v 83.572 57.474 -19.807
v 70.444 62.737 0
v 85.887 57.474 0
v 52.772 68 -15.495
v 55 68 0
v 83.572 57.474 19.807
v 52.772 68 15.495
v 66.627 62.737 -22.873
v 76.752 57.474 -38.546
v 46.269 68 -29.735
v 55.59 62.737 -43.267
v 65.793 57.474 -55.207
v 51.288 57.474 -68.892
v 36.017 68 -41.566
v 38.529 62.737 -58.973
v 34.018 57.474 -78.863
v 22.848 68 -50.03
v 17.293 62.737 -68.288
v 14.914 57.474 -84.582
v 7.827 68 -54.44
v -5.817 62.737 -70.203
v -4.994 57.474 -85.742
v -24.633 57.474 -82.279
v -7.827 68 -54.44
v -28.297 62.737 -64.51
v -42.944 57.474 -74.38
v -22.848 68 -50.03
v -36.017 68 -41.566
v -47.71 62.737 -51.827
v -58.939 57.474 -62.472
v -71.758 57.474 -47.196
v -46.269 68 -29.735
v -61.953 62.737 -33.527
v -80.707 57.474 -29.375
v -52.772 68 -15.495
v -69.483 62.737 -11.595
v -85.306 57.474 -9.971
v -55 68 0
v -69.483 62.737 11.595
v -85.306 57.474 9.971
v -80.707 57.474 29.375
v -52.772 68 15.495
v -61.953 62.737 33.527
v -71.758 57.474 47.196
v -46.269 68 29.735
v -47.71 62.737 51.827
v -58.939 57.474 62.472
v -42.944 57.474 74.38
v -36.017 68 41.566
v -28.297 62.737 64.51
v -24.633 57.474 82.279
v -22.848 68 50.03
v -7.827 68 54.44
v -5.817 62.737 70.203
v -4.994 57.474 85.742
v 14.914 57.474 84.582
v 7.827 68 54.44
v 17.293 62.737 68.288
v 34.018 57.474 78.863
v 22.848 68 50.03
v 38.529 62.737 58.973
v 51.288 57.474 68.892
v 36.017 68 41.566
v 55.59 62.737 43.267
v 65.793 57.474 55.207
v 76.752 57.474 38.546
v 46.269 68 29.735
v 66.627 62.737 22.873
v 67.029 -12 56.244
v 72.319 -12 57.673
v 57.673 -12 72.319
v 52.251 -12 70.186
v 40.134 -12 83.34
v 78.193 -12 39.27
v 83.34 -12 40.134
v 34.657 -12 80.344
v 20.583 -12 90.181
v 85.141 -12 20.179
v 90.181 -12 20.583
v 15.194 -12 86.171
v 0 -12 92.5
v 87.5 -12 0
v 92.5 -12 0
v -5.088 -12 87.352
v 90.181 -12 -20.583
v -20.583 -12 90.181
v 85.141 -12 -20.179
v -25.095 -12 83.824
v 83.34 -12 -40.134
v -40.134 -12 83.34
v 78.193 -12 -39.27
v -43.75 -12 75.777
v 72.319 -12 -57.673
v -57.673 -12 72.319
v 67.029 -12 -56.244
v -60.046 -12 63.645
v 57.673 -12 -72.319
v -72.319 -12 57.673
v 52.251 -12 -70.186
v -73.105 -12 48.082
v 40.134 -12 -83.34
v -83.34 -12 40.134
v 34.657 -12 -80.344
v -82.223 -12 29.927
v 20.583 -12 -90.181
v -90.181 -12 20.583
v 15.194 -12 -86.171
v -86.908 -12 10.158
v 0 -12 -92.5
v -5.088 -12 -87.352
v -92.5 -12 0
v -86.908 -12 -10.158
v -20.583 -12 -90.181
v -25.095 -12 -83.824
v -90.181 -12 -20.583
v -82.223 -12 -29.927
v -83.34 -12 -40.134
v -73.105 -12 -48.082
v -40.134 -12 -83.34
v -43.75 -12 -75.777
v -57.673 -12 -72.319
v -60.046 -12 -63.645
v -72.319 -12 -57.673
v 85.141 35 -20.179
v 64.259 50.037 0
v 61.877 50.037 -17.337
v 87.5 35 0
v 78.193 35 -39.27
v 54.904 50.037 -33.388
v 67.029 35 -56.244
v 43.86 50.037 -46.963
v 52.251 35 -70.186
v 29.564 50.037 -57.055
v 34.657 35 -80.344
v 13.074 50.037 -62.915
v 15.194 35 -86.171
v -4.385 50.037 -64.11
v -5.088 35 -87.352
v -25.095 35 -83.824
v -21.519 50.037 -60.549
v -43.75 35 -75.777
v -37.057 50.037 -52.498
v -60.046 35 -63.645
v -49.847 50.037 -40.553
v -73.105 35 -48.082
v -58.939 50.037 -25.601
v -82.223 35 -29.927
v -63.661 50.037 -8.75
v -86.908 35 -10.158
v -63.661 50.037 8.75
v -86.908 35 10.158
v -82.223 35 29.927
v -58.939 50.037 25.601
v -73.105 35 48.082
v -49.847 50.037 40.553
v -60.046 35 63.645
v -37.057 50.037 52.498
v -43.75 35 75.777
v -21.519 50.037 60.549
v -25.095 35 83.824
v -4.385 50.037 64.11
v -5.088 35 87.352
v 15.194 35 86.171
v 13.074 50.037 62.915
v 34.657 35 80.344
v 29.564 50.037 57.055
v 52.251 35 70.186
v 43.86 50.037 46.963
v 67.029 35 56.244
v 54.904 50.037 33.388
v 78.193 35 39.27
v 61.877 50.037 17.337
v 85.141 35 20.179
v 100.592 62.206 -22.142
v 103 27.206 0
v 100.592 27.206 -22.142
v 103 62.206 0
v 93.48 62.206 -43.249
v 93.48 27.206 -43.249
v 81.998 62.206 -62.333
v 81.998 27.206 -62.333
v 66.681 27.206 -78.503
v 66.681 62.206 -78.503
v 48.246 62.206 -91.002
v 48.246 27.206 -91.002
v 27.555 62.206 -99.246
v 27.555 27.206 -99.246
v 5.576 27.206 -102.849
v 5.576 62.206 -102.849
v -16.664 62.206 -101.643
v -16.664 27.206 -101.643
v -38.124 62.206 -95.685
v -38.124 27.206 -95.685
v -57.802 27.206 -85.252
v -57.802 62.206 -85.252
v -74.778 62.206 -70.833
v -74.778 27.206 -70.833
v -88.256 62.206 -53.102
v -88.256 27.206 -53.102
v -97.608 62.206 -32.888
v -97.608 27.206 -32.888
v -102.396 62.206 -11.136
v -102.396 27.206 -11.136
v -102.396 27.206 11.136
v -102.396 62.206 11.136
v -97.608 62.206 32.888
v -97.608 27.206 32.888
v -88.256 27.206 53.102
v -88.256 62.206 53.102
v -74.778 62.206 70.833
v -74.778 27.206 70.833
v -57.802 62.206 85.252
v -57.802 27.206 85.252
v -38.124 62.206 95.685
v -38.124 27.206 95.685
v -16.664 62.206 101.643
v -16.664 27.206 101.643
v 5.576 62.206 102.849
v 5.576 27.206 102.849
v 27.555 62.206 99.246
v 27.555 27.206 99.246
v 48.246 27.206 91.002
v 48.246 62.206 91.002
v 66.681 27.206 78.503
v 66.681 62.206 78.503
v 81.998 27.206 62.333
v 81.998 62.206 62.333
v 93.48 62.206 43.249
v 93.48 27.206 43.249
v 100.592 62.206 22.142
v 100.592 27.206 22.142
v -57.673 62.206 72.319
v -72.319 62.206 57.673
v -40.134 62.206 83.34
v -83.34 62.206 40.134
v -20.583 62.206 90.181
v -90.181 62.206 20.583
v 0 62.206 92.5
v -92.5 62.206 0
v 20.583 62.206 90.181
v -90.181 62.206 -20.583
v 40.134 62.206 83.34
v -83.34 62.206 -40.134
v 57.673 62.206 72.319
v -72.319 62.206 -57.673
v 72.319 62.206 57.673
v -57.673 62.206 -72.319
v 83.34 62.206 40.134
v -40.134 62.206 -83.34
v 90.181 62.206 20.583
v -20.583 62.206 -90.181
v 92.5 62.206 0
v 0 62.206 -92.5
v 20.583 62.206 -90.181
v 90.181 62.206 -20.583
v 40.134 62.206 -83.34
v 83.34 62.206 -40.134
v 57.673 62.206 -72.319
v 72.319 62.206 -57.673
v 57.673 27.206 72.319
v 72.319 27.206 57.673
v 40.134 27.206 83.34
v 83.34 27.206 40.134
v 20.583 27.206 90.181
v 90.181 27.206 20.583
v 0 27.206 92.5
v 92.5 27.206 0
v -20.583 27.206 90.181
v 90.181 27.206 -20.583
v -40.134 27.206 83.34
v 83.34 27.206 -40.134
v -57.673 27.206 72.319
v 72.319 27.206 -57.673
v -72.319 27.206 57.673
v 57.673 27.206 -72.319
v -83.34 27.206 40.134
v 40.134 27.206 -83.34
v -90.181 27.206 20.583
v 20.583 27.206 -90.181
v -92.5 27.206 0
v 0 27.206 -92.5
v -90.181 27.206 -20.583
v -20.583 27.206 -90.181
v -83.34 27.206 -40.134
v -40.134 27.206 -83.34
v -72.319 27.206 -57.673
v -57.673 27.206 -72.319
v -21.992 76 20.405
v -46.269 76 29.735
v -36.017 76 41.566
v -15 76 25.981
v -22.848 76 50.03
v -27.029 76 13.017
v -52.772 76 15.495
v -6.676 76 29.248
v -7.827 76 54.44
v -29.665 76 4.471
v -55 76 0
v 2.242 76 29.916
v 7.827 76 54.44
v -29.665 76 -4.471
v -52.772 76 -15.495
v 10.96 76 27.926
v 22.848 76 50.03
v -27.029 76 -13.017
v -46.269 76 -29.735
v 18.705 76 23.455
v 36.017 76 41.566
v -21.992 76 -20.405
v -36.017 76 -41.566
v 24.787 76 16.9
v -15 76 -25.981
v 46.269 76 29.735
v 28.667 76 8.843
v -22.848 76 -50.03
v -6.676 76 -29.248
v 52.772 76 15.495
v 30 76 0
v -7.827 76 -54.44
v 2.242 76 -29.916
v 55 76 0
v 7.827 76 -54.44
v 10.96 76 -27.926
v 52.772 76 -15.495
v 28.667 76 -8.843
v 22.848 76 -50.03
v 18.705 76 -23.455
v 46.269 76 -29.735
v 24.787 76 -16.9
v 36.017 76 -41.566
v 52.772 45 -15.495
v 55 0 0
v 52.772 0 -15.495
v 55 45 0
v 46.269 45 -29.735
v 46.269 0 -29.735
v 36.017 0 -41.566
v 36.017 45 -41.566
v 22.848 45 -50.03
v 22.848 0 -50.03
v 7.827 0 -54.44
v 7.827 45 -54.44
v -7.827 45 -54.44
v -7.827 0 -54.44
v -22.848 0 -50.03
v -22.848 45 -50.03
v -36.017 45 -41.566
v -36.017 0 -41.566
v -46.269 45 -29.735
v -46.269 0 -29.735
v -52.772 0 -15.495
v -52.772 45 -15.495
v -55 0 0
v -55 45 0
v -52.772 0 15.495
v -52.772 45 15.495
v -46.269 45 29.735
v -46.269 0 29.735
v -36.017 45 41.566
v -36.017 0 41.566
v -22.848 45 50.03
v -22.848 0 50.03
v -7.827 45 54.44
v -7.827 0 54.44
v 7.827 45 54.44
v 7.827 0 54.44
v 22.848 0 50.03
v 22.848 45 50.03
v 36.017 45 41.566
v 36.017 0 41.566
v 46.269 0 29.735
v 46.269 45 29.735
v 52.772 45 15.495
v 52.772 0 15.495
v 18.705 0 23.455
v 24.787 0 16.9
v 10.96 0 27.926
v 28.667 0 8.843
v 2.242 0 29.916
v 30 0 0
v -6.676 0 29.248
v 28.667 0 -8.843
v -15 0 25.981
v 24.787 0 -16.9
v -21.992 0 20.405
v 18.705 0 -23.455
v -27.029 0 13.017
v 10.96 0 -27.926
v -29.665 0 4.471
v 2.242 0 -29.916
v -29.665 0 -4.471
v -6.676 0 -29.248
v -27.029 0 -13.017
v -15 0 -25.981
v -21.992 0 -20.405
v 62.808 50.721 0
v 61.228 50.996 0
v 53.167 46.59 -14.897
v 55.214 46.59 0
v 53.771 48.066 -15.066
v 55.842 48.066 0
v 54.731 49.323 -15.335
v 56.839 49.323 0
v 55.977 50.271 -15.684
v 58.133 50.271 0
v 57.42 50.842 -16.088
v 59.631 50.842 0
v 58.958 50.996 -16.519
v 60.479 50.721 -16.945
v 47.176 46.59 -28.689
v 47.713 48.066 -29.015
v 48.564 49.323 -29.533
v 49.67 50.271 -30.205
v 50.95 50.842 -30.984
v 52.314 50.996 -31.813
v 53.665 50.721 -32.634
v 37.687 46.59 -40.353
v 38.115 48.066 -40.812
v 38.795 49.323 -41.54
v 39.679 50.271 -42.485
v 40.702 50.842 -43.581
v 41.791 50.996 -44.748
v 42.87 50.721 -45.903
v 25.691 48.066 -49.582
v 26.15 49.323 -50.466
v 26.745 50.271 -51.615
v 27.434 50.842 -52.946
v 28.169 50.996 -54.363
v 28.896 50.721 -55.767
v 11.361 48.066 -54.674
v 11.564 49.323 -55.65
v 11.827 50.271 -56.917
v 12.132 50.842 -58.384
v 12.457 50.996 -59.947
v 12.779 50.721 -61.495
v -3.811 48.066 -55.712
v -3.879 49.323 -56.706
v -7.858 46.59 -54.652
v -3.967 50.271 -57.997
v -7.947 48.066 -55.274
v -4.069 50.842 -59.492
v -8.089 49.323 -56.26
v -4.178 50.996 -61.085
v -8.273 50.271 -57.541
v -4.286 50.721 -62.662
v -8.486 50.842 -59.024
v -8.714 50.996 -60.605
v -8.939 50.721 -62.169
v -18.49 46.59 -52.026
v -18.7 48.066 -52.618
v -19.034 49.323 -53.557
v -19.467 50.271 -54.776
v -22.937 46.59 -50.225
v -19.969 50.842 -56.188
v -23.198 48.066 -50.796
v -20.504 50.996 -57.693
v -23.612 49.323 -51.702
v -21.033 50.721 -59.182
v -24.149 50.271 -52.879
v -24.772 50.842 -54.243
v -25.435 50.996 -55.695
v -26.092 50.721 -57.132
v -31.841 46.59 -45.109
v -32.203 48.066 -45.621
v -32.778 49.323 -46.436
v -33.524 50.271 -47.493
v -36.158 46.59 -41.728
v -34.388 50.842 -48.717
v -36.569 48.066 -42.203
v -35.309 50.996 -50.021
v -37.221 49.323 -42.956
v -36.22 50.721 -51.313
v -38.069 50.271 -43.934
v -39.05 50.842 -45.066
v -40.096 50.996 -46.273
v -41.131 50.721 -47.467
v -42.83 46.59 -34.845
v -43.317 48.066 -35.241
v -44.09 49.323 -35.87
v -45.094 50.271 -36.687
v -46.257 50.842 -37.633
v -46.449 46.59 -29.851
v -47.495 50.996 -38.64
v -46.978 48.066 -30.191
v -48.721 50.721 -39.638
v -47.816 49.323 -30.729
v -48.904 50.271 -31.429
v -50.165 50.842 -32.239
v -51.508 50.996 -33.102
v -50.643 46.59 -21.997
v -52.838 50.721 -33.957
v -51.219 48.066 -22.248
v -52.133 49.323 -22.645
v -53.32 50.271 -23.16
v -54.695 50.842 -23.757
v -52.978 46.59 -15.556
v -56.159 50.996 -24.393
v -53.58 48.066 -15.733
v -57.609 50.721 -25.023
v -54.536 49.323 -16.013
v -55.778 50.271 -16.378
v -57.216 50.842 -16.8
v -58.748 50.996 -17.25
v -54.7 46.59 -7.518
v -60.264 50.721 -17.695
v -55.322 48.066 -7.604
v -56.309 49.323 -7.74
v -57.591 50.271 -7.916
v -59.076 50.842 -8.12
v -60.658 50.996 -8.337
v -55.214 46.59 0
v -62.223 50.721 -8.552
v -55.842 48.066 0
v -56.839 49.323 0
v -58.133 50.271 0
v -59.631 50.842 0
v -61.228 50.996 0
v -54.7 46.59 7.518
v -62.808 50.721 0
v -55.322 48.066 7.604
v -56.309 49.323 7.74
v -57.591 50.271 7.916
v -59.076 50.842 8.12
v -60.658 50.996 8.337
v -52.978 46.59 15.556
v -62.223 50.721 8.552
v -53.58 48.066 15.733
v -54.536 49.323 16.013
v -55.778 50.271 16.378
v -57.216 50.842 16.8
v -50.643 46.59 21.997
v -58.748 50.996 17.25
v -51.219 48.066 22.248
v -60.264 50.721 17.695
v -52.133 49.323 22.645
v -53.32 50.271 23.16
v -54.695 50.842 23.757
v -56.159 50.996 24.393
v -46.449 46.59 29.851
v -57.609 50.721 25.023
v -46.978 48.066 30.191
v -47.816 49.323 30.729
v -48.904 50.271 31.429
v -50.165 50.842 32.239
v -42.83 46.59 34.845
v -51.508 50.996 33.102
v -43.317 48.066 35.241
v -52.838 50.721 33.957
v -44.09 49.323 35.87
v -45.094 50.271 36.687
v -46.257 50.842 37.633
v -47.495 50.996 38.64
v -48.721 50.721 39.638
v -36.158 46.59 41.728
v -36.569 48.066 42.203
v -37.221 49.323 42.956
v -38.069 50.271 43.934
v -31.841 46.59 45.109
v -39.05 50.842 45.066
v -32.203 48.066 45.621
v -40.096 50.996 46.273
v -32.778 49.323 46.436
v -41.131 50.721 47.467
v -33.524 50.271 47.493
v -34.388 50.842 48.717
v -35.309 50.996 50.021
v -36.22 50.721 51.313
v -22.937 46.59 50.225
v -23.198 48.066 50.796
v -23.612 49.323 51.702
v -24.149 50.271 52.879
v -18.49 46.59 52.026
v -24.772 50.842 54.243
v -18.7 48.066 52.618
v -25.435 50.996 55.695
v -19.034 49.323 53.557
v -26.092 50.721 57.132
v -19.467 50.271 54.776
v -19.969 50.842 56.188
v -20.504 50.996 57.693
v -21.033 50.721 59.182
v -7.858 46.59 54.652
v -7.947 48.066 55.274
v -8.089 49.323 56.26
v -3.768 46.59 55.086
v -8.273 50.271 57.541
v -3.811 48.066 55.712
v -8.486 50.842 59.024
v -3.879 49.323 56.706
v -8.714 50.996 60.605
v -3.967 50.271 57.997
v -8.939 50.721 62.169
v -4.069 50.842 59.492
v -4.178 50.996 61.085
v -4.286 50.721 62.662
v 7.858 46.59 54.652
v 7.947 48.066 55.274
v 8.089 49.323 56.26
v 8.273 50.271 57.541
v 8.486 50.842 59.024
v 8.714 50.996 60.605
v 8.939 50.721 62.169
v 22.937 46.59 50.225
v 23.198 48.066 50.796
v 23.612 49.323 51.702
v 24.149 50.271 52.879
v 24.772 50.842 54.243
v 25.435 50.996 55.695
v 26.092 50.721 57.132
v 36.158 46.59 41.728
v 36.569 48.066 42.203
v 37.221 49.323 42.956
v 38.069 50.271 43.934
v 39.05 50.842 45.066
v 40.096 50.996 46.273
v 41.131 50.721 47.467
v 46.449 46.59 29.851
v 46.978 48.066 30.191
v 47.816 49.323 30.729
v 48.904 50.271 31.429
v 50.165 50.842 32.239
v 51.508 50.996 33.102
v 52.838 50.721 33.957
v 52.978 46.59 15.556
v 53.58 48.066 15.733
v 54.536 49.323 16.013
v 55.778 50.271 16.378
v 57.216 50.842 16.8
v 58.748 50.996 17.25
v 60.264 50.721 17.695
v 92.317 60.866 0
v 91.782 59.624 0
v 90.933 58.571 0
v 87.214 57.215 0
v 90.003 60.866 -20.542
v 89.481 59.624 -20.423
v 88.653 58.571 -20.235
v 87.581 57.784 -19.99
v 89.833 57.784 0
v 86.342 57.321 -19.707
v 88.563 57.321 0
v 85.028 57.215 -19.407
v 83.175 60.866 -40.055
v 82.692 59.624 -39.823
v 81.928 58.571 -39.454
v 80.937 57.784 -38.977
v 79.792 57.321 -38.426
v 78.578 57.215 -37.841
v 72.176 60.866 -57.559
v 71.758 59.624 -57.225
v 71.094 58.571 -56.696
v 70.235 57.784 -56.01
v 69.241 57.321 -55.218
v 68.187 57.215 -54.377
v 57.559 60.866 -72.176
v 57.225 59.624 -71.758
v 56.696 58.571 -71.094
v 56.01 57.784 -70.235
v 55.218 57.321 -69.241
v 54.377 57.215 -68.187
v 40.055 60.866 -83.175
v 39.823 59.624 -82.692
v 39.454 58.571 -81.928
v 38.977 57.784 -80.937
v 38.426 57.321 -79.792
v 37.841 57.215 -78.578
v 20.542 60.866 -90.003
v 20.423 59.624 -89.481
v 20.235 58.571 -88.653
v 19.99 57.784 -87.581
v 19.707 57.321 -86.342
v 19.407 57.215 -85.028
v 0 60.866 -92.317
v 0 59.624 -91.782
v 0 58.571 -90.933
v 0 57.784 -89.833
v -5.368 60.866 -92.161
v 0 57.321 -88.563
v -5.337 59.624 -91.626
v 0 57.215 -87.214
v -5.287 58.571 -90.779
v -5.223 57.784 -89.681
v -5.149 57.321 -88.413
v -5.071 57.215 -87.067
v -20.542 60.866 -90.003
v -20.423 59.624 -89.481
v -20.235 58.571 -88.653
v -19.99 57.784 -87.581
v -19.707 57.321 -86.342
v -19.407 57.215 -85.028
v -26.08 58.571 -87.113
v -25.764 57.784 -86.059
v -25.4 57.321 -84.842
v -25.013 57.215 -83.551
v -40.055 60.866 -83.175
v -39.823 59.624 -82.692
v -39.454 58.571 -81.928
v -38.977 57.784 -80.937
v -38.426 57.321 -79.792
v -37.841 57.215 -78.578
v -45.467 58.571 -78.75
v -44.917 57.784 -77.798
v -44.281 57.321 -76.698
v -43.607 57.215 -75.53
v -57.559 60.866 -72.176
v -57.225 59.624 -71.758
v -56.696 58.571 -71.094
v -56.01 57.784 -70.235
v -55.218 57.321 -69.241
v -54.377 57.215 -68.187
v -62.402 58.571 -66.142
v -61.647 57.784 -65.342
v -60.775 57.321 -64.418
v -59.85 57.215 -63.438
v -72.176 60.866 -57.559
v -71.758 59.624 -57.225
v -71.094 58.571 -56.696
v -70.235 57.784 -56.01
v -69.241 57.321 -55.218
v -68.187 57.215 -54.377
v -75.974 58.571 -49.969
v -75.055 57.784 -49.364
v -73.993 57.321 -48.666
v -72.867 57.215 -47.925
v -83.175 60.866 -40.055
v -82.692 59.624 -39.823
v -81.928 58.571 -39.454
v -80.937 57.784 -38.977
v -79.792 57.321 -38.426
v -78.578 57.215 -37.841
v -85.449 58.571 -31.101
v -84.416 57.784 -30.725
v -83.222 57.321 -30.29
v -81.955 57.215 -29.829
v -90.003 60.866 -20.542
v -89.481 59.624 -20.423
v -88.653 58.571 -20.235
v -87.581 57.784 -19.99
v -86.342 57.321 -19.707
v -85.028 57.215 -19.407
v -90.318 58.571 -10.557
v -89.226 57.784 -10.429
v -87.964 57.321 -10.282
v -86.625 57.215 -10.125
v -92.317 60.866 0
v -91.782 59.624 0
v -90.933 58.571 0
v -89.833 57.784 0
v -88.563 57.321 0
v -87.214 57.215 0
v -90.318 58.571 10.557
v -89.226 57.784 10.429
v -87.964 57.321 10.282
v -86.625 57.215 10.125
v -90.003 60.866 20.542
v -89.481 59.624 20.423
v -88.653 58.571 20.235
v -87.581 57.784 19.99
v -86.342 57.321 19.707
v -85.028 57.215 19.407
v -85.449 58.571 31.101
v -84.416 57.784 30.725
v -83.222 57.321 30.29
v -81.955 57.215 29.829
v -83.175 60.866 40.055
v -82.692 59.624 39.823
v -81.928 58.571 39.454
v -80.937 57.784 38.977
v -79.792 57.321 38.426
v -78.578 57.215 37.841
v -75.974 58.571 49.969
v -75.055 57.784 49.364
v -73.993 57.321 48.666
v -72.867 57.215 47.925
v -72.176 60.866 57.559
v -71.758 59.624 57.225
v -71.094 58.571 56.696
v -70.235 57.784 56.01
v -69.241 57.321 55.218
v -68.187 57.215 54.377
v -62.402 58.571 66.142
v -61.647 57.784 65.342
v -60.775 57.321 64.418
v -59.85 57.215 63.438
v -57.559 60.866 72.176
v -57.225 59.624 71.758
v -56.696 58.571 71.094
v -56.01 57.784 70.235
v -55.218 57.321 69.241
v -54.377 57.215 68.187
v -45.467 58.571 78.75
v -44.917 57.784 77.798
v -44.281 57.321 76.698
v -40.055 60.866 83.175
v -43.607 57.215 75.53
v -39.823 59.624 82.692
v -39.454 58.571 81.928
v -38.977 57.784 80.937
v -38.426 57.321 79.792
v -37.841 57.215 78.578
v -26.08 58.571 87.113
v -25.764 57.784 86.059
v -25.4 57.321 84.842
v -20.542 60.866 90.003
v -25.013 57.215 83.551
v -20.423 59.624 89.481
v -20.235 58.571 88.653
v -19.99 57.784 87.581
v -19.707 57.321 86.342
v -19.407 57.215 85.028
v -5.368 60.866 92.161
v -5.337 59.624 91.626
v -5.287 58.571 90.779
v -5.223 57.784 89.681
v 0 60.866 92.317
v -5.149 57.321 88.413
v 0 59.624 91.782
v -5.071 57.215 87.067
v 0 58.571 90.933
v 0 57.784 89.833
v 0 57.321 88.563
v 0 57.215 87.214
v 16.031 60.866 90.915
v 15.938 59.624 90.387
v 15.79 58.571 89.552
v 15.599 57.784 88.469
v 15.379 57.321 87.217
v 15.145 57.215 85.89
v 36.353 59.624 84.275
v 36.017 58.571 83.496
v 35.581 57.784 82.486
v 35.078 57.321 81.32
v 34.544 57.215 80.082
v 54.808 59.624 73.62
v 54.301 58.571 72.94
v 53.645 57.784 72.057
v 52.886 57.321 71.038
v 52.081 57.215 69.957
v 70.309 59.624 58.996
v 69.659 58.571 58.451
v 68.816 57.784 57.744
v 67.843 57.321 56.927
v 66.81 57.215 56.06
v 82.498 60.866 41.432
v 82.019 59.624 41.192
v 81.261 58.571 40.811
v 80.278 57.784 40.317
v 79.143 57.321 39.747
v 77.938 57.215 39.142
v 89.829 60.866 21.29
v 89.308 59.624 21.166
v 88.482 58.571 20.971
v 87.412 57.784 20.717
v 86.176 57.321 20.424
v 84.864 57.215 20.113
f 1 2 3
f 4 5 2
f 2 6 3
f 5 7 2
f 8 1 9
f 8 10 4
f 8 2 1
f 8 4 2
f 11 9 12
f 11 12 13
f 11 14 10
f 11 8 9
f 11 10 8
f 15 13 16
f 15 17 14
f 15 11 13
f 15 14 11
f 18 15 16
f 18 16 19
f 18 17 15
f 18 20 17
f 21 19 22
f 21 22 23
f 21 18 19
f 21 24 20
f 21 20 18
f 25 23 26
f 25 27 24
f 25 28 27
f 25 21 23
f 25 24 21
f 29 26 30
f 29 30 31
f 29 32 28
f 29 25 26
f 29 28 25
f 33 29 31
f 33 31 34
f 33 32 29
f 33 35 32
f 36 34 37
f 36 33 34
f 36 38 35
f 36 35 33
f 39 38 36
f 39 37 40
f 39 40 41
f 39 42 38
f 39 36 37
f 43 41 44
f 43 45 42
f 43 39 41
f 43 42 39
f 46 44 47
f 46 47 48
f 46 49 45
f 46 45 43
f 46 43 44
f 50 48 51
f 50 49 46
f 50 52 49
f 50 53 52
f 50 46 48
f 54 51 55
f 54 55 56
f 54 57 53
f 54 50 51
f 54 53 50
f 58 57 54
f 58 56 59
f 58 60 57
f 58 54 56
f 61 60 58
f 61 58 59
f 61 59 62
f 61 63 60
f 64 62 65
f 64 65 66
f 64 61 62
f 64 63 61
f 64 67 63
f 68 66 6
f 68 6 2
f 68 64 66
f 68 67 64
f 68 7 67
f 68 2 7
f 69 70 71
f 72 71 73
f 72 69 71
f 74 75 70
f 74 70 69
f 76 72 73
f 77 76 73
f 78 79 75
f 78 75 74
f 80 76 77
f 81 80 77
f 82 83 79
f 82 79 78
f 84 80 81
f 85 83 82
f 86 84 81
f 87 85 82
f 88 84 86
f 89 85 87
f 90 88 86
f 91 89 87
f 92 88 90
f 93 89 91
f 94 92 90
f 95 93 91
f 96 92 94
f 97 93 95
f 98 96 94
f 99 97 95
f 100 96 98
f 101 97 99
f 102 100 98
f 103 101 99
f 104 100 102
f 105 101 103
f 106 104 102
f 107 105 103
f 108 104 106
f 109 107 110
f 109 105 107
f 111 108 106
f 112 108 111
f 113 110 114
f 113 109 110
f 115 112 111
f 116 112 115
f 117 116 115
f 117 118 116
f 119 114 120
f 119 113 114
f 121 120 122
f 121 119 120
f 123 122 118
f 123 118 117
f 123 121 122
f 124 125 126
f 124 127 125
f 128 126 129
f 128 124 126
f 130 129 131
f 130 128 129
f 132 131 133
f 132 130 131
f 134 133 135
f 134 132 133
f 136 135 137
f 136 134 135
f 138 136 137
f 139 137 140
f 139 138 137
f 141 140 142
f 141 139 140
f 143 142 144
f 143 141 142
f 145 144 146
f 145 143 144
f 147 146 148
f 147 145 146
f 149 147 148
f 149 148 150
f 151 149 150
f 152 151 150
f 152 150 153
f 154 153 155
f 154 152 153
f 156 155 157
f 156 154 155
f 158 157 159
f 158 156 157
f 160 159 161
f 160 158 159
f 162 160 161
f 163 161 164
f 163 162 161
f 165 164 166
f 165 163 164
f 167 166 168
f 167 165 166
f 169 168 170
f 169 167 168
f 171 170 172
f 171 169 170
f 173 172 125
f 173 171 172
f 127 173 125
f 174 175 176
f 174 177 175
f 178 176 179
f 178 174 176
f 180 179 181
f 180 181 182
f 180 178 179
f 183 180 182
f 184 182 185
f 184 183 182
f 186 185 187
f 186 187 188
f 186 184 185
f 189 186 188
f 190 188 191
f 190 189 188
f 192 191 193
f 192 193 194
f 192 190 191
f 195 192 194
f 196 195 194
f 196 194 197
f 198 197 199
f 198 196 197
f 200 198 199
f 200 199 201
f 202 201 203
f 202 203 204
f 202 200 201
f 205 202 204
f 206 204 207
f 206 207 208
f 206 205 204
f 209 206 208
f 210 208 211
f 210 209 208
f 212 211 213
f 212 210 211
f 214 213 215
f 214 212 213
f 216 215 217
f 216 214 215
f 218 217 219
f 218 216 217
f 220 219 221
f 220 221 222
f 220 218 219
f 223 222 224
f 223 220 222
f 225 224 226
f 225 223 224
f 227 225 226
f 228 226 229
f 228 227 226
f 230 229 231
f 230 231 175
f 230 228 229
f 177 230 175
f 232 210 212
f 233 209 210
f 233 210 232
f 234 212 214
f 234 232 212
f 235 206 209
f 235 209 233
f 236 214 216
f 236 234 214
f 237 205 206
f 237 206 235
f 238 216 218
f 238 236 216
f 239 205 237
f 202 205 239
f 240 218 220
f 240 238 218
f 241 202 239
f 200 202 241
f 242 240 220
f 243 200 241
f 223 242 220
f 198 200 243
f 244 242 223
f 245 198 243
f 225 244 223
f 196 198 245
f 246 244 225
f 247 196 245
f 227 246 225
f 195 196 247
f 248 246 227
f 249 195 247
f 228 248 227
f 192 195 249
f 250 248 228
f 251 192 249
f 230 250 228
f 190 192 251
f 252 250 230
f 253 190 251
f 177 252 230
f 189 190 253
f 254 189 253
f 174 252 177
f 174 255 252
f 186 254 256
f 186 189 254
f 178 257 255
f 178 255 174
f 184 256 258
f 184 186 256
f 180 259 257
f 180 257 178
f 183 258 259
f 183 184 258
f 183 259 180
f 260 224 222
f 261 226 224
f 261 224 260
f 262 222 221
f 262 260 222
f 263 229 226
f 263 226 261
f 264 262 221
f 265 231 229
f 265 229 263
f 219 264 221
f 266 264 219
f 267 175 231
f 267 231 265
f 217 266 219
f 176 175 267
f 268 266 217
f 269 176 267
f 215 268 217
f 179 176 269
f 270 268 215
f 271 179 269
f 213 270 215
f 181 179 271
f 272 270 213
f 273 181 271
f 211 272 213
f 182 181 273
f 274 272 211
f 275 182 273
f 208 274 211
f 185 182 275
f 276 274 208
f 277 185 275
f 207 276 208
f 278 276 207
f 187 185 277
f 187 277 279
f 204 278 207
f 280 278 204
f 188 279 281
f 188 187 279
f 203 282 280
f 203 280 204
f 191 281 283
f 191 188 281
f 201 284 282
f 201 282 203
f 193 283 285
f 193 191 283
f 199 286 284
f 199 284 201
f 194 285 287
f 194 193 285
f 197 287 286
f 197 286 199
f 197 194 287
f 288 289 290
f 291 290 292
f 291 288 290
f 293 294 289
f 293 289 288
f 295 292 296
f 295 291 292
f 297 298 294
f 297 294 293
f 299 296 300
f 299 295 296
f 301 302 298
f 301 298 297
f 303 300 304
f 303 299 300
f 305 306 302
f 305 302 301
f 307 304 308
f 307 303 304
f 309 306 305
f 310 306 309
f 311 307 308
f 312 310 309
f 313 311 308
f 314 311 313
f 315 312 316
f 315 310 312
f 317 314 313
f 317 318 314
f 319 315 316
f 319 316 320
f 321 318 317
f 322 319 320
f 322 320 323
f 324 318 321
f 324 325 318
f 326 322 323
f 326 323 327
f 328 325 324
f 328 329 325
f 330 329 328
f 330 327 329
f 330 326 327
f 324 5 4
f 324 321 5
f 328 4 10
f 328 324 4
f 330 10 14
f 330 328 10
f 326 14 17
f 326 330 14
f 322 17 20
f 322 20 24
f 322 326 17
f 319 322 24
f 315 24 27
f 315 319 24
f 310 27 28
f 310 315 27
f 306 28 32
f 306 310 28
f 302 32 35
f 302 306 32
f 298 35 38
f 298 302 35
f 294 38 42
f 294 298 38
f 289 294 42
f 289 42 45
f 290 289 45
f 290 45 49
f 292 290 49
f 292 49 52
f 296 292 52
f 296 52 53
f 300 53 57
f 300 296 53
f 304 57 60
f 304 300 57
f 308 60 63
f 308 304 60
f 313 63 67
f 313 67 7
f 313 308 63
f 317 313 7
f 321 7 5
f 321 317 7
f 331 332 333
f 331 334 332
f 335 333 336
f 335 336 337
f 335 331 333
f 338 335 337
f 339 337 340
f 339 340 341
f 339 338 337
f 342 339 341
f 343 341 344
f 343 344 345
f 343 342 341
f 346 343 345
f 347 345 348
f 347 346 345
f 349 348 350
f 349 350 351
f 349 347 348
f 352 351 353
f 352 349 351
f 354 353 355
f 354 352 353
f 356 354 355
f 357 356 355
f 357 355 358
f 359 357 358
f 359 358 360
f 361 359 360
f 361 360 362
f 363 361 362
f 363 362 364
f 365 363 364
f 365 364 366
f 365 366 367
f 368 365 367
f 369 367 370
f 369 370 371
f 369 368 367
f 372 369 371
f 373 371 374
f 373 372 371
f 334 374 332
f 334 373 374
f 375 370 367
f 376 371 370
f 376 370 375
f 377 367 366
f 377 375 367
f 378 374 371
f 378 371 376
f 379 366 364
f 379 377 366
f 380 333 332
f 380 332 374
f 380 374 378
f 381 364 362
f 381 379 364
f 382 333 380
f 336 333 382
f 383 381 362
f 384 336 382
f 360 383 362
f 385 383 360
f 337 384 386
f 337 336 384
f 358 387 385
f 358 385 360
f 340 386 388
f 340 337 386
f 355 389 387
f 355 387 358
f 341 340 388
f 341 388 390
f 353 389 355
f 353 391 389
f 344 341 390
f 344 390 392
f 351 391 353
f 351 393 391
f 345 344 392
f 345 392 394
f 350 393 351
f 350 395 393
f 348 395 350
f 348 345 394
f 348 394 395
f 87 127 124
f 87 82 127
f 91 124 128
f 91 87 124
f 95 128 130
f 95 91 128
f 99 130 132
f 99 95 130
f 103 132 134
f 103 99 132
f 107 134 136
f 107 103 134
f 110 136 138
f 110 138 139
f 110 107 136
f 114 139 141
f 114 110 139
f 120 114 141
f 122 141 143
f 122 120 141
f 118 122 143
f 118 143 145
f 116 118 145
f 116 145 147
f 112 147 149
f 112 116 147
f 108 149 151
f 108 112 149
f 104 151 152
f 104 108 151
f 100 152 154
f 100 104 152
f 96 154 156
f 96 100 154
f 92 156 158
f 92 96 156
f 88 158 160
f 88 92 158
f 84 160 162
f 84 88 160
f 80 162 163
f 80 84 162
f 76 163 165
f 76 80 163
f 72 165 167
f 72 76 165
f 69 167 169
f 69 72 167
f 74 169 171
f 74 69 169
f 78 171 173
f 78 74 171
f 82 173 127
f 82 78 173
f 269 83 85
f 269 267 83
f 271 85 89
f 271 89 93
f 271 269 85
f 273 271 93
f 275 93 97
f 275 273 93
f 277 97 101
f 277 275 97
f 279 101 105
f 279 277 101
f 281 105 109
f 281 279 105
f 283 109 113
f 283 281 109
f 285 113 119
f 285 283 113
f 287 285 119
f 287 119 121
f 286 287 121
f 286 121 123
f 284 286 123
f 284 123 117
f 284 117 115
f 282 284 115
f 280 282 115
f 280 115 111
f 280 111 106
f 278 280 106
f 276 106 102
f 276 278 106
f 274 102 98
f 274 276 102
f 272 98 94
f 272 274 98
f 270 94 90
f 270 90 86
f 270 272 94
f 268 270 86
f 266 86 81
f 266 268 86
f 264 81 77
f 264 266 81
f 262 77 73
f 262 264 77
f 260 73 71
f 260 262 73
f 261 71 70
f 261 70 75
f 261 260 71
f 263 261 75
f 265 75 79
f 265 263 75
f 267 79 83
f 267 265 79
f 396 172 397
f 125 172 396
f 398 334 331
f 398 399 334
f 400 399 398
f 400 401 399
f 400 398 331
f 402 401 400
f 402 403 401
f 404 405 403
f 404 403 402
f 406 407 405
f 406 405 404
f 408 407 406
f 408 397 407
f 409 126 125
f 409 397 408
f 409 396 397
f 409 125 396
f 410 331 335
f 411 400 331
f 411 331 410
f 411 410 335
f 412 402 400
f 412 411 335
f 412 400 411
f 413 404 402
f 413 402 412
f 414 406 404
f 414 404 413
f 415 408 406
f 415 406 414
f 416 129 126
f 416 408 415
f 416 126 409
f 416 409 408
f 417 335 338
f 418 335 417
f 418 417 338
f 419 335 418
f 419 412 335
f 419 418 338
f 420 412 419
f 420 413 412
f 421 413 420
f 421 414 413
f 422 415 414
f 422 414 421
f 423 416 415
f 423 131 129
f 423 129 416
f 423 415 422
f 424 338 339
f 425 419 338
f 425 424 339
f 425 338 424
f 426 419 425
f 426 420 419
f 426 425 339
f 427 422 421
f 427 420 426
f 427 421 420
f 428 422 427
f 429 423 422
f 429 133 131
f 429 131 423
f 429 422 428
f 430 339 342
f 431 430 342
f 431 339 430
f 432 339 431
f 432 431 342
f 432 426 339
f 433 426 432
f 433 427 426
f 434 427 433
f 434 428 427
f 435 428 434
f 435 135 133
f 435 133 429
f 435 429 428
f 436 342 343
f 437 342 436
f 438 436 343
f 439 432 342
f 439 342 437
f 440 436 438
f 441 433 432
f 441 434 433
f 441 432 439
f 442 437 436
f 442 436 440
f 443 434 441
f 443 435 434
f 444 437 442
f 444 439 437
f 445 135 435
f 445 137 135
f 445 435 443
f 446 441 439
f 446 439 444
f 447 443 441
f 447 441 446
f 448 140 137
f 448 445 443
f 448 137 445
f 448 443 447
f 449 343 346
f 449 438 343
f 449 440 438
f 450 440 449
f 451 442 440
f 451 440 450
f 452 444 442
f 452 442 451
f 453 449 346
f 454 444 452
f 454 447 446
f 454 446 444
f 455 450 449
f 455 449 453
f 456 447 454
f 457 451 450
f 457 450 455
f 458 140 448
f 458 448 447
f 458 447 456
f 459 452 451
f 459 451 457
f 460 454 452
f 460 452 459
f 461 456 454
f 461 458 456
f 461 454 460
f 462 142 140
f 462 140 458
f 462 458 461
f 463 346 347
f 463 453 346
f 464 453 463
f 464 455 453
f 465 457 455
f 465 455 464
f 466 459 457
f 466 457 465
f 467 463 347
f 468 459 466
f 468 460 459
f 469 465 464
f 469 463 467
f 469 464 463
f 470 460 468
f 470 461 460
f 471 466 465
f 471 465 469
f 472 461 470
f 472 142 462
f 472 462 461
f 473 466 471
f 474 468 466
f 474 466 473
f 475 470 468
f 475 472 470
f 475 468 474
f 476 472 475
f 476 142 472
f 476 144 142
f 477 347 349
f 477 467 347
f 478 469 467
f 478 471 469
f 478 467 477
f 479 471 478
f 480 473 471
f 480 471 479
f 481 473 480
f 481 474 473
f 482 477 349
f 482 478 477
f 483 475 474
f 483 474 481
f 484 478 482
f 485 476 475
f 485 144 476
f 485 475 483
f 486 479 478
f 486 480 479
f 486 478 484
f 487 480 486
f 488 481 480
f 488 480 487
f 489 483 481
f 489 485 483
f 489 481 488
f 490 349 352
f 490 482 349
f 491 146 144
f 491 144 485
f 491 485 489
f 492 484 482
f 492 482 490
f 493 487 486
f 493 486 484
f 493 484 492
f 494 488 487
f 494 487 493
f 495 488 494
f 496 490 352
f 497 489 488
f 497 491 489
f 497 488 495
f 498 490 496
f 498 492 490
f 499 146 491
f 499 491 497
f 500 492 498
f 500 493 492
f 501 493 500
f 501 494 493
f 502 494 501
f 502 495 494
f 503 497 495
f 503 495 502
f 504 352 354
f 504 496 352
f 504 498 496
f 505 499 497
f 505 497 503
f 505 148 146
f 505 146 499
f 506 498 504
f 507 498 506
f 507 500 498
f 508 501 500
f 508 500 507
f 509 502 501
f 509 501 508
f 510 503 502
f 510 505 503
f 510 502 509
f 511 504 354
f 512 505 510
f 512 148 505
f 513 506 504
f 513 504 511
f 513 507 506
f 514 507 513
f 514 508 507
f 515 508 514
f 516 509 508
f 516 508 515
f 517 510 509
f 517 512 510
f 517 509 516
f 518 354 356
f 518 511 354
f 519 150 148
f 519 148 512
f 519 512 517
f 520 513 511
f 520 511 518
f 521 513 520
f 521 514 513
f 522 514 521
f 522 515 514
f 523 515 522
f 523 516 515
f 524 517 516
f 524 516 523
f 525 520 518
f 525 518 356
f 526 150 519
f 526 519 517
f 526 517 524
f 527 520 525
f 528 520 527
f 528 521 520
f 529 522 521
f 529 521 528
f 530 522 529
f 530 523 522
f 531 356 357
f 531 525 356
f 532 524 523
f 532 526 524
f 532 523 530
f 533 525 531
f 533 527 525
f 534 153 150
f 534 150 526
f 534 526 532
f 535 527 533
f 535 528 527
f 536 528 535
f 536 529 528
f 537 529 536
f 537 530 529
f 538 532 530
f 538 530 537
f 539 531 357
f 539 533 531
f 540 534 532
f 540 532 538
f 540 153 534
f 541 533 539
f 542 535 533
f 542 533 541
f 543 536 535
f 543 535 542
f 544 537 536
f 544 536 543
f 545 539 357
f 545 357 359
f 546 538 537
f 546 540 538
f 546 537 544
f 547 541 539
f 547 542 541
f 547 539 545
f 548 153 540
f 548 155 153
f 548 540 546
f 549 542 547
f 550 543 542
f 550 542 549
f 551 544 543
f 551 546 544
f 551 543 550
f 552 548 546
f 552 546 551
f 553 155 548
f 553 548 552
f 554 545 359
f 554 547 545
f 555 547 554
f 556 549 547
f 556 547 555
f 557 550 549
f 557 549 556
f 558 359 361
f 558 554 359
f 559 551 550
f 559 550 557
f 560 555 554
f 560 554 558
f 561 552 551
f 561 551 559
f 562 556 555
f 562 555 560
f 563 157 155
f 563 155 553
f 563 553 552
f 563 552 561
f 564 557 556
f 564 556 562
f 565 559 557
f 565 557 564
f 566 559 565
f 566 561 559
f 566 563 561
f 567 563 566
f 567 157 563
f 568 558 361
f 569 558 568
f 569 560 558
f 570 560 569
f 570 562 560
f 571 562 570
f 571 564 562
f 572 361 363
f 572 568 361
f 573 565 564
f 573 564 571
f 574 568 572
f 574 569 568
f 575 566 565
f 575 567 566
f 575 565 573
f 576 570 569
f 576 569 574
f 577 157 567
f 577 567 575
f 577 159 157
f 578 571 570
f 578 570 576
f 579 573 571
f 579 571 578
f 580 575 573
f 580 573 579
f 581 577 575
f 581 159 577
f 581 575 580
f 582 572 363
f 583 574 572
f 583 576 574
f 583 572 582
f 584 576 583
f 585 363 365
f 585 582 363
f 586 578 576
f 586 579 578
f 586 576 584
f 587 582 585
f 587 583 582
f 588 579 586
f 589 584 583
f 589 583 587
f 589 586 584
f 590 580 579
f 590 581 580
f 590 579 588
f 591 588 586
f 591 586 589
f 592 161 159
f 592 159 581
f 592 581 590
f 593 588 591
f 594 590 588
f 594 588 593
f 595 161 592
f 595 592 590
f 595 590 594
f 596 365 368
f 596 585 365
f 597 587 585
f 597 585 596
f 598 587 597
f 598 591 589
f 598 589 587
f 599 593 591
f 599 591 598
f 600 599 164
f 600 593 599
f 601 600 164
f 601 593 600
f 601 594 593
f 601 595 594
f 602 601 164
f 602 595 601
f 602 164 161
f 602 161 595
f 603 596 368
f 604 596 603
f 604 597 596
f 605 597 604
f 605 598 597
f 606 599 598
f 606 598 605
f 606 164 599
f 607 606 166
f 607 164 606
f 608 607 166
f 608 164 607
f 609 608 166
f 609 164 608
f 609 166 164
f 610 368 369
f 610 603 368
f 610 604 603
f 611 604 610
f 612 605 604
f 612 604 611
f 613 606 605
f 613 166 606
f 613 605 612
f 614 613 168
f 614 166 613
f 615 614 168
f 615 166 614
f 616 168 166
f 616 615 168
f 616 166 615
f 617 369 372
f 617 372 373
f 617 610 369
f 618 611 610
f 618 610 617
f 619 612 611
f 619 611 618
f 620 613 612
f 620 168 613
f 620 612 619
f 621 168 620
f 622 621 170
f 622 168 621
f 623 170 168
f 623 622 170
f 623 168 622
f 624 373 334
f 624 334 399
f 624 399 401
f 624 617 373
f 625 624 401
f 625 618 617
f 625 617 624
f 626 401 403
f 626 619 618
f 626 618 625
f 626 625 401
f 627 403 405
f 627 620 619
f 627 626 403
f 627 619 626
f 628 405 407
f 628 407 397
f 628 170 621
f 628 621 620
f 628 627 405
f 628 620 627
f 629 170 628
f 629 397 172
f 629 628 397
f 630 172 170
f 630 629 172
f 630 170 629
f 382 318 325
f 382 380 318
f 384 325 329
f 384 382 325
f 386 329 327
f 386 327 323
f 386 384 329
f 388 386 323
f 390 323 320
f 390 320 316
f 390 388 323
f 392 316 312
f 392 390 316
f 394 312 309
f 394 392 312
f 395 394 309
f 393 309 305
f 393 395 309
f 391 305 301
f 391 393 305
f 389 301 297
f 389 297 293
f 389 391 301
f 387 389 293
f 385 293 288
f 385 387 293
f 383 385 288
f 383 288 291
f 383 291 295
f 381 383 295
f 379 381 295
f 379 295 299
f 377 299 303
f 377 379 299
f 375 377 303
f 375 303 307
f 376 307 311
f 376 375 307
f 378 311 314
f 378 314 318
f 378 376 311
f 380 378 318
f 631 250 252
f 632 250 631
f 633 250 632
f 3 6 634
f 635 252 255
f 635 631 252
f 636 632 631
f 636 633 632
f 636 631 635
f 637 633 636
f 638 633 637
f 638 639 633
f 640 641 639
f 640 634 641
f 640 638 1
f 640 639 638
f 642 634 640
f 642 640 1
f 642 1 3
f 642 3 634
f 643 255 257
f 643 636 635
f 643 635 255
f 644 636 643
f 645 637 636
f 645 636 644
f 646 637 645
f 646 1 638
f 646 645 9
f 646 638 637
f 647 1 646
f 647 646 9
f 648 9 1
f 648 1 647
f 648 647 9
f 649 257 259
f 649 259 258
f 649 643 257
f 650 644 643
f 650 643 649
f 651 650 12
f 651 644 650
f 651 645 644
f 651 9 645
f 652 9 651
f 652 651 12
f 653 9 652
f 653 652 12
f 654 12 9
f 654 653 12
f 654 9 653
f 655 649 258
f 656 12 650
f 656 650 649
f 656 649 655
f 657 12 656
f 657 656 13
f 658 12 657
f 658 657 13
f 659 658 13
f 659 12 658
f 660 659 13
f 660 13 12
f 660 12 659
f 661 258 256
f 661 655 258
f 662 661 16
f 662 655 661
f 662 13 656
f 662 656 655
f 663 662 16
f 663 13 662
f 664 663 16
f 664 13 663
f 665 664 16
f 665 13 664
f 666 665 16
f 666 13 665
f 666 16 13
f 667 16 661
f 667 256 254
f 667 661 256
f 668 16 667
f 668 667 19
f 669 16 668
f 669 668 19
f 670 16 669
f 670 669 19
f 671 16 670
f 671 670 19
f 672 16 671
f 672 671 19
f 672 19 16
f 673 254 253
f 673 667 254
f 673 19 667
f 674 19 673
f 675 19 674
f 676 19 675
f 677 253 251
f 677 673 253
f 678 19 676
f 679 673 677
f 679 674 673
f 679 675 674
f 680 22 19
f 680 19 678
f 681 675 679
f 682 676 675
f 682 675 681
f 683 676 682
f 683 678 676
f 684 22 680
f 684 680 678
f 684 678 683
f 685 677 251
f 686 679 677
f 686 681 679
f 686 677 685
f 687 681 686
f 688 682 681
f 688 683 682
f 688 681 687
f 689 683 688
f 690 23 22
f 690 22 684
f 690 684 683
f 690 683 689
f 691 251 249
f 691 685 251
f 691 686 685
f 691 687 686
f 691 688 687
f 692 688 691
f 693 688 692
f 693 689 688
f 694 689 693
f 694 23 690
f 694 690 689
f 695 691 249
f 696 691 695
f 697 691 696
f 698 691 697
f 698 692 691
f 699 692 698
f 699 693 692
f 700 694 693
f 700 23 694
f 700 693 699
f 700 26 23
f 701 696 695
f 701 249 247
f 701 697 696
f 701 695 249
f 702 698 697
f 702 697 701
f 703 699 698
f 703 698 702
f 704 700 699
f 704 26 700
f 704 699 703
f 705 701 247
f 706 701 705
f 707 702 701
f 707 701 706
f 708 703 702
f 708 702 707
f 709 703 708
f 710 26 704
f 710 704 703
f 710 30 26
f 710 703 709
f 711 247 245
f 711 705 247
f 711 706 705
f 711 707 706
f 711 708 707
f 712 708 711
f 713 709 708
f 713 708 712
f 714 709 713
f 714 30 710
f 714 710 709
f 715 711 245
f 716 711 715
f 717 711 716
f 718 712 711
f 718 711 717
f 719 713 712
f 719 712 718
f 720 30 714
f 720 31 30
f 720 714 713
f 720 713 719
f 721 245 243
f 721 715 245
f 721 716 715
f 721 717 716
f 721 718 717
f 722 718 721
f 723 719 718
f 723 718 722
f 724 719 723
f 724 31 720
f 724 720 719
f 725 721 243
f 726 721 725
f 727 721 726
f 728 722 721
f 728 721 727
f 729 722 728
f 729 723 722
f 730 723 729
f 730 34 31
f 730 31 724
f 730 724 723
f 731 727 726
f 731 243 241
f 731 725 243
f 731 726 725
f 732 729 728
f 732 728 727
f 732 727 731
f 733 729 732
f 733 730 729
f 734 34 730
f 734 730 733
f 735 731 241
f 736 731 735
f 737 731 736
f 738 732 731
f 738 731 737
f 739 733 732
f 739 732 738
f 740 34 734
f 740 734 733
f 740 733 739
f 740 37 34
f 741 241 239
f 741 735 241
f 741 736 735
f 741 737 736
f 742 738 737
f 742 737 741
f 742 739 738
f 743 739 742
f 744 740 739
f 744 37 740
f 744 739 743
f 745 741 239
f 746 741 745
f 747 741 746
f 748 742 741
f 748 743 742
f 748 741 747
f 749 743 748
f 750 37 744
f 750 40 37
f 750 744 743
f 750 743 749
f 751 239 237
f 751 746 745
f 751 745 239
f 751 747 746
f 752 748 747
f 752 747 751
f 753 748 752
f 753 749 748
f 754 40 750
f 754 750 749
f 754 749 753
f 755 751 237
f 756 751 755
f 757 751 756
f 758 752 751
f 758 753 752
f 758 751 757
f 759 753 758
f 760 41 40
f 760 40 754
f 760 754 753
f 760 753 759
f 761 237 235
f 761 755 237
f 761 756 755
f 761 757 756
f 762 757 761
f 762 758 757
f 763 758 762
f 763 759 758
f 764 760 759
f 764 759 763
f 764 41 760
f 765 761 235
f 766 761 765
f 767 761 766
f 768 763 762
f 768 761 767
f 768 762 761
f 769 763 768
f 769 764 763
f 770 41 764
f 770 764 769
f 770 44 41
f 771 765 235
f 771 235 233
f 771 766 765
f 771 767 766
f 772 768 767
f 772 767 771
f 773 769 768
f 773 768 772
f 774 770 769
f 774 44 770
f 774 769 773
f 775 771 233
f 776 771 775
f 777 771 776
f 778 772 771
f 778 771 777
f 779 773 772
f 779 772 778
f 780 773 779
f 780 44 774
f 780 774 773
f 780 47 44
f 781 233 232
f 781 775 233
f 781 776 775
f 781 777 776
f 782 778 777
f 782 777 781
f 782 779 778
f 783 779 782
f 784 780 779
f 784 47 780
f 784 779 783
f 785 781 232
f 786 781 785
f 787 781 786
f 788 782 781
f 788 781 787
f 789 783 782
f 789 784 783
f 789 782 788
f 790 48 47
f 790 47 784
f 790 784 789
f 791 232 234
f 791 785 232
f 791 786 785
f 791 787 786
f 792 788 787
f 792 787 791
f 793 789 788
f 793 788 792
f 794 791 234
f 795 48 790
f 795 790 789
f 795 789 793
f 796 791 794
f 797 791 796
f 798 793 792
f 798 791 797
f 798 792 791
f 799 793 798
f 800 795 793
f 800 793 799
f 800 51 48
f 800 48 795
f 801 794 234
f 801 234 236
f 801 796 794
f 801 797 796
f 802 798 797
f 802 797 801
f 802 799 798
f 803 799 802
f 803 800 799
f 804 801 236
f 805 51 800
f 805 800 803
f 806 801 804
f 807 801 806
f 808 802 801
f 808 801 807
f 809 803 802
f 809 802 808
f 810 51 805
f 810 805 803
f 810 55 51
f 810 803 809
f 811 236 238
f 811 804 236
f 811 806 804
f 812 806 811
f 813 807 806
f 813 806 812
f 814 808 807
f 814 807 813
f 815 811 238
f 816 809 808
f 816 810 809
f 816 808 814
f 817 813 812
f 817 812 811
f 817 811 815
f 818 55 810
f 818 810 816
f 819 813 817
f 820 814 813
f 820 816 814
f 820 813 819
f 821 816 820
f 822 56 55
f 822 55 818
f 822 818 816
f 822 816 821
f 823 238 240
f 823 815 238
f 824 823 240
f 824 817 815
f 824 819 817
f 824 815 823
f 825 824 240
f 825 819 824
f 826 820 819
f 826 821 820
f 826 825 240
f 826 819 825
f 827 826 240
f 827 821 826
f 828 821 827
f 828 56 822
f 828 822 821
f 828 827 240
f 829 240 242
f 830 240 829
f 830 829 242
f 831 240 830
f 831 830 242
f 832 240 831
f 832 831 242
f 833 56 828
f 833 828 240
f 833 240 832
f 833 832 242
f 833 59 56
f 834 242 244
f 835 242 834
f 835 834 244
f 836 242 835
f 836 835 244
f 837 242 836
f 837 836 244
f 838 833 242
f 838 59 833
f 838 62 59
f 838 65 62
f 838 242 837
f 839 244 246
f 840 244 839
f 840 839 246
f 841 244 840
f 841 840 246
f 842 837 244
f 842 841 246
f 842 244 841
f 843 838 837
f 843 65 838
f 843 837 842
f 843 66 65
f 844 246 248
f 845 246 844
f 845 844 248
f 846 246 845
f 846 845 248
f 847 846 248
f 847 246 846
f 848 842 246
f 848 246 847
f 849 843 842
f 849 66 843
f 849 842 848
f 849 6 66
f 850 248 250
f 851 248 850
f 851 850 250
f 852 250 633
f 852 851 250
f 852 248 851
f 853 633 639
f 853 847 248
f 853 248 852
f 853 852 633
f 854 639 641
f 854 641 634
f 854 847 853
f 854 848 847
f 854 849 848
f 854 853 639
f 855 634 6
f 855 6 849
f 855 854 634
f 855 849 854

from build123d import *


with BuildPart() as part:
    # Sketch1 → Revolve1 (revolve)
    with BuildSketch(Plane.XY):
        with BuildLine():
            Line((30, 76), (30, 0))
            Line((30, 0), (55, 0))
            Line((55, 0), (55, 45))
            ThreePointArc((55, 45), (58.132644659, 50.270509781), (64.259424449, 50.03747479))
            Line((64.259424449, 50.03747479), (87.5, 35))
            Line((87.5, 35), (87.5, -12))
            Line((87.5, -12), (92.5, -12))
            Line((92.5, -12), (92.5, 27.206415499))
            Line((92.5, 27.206415499), (103, 27.206415499))
            Line((103, 27.206415499), (103, 62.206415499))
            Line((103, 62.206415499), (92.5, 62.206415499))
            ThreePointArc((92.5, 62.206415499), (90.409938476, 58.140427542), (85.887096774, 57.473705579))
            Line((85.887096774, 57.473705579), (55, 68))
            Line((55, 68), (55, 76))
            Line((55, 76), (30, 76))
        make_face()
    revolve(axis=Axis((0, -19.792449206, 0), (0, 1, 0)))


solid = part.part
